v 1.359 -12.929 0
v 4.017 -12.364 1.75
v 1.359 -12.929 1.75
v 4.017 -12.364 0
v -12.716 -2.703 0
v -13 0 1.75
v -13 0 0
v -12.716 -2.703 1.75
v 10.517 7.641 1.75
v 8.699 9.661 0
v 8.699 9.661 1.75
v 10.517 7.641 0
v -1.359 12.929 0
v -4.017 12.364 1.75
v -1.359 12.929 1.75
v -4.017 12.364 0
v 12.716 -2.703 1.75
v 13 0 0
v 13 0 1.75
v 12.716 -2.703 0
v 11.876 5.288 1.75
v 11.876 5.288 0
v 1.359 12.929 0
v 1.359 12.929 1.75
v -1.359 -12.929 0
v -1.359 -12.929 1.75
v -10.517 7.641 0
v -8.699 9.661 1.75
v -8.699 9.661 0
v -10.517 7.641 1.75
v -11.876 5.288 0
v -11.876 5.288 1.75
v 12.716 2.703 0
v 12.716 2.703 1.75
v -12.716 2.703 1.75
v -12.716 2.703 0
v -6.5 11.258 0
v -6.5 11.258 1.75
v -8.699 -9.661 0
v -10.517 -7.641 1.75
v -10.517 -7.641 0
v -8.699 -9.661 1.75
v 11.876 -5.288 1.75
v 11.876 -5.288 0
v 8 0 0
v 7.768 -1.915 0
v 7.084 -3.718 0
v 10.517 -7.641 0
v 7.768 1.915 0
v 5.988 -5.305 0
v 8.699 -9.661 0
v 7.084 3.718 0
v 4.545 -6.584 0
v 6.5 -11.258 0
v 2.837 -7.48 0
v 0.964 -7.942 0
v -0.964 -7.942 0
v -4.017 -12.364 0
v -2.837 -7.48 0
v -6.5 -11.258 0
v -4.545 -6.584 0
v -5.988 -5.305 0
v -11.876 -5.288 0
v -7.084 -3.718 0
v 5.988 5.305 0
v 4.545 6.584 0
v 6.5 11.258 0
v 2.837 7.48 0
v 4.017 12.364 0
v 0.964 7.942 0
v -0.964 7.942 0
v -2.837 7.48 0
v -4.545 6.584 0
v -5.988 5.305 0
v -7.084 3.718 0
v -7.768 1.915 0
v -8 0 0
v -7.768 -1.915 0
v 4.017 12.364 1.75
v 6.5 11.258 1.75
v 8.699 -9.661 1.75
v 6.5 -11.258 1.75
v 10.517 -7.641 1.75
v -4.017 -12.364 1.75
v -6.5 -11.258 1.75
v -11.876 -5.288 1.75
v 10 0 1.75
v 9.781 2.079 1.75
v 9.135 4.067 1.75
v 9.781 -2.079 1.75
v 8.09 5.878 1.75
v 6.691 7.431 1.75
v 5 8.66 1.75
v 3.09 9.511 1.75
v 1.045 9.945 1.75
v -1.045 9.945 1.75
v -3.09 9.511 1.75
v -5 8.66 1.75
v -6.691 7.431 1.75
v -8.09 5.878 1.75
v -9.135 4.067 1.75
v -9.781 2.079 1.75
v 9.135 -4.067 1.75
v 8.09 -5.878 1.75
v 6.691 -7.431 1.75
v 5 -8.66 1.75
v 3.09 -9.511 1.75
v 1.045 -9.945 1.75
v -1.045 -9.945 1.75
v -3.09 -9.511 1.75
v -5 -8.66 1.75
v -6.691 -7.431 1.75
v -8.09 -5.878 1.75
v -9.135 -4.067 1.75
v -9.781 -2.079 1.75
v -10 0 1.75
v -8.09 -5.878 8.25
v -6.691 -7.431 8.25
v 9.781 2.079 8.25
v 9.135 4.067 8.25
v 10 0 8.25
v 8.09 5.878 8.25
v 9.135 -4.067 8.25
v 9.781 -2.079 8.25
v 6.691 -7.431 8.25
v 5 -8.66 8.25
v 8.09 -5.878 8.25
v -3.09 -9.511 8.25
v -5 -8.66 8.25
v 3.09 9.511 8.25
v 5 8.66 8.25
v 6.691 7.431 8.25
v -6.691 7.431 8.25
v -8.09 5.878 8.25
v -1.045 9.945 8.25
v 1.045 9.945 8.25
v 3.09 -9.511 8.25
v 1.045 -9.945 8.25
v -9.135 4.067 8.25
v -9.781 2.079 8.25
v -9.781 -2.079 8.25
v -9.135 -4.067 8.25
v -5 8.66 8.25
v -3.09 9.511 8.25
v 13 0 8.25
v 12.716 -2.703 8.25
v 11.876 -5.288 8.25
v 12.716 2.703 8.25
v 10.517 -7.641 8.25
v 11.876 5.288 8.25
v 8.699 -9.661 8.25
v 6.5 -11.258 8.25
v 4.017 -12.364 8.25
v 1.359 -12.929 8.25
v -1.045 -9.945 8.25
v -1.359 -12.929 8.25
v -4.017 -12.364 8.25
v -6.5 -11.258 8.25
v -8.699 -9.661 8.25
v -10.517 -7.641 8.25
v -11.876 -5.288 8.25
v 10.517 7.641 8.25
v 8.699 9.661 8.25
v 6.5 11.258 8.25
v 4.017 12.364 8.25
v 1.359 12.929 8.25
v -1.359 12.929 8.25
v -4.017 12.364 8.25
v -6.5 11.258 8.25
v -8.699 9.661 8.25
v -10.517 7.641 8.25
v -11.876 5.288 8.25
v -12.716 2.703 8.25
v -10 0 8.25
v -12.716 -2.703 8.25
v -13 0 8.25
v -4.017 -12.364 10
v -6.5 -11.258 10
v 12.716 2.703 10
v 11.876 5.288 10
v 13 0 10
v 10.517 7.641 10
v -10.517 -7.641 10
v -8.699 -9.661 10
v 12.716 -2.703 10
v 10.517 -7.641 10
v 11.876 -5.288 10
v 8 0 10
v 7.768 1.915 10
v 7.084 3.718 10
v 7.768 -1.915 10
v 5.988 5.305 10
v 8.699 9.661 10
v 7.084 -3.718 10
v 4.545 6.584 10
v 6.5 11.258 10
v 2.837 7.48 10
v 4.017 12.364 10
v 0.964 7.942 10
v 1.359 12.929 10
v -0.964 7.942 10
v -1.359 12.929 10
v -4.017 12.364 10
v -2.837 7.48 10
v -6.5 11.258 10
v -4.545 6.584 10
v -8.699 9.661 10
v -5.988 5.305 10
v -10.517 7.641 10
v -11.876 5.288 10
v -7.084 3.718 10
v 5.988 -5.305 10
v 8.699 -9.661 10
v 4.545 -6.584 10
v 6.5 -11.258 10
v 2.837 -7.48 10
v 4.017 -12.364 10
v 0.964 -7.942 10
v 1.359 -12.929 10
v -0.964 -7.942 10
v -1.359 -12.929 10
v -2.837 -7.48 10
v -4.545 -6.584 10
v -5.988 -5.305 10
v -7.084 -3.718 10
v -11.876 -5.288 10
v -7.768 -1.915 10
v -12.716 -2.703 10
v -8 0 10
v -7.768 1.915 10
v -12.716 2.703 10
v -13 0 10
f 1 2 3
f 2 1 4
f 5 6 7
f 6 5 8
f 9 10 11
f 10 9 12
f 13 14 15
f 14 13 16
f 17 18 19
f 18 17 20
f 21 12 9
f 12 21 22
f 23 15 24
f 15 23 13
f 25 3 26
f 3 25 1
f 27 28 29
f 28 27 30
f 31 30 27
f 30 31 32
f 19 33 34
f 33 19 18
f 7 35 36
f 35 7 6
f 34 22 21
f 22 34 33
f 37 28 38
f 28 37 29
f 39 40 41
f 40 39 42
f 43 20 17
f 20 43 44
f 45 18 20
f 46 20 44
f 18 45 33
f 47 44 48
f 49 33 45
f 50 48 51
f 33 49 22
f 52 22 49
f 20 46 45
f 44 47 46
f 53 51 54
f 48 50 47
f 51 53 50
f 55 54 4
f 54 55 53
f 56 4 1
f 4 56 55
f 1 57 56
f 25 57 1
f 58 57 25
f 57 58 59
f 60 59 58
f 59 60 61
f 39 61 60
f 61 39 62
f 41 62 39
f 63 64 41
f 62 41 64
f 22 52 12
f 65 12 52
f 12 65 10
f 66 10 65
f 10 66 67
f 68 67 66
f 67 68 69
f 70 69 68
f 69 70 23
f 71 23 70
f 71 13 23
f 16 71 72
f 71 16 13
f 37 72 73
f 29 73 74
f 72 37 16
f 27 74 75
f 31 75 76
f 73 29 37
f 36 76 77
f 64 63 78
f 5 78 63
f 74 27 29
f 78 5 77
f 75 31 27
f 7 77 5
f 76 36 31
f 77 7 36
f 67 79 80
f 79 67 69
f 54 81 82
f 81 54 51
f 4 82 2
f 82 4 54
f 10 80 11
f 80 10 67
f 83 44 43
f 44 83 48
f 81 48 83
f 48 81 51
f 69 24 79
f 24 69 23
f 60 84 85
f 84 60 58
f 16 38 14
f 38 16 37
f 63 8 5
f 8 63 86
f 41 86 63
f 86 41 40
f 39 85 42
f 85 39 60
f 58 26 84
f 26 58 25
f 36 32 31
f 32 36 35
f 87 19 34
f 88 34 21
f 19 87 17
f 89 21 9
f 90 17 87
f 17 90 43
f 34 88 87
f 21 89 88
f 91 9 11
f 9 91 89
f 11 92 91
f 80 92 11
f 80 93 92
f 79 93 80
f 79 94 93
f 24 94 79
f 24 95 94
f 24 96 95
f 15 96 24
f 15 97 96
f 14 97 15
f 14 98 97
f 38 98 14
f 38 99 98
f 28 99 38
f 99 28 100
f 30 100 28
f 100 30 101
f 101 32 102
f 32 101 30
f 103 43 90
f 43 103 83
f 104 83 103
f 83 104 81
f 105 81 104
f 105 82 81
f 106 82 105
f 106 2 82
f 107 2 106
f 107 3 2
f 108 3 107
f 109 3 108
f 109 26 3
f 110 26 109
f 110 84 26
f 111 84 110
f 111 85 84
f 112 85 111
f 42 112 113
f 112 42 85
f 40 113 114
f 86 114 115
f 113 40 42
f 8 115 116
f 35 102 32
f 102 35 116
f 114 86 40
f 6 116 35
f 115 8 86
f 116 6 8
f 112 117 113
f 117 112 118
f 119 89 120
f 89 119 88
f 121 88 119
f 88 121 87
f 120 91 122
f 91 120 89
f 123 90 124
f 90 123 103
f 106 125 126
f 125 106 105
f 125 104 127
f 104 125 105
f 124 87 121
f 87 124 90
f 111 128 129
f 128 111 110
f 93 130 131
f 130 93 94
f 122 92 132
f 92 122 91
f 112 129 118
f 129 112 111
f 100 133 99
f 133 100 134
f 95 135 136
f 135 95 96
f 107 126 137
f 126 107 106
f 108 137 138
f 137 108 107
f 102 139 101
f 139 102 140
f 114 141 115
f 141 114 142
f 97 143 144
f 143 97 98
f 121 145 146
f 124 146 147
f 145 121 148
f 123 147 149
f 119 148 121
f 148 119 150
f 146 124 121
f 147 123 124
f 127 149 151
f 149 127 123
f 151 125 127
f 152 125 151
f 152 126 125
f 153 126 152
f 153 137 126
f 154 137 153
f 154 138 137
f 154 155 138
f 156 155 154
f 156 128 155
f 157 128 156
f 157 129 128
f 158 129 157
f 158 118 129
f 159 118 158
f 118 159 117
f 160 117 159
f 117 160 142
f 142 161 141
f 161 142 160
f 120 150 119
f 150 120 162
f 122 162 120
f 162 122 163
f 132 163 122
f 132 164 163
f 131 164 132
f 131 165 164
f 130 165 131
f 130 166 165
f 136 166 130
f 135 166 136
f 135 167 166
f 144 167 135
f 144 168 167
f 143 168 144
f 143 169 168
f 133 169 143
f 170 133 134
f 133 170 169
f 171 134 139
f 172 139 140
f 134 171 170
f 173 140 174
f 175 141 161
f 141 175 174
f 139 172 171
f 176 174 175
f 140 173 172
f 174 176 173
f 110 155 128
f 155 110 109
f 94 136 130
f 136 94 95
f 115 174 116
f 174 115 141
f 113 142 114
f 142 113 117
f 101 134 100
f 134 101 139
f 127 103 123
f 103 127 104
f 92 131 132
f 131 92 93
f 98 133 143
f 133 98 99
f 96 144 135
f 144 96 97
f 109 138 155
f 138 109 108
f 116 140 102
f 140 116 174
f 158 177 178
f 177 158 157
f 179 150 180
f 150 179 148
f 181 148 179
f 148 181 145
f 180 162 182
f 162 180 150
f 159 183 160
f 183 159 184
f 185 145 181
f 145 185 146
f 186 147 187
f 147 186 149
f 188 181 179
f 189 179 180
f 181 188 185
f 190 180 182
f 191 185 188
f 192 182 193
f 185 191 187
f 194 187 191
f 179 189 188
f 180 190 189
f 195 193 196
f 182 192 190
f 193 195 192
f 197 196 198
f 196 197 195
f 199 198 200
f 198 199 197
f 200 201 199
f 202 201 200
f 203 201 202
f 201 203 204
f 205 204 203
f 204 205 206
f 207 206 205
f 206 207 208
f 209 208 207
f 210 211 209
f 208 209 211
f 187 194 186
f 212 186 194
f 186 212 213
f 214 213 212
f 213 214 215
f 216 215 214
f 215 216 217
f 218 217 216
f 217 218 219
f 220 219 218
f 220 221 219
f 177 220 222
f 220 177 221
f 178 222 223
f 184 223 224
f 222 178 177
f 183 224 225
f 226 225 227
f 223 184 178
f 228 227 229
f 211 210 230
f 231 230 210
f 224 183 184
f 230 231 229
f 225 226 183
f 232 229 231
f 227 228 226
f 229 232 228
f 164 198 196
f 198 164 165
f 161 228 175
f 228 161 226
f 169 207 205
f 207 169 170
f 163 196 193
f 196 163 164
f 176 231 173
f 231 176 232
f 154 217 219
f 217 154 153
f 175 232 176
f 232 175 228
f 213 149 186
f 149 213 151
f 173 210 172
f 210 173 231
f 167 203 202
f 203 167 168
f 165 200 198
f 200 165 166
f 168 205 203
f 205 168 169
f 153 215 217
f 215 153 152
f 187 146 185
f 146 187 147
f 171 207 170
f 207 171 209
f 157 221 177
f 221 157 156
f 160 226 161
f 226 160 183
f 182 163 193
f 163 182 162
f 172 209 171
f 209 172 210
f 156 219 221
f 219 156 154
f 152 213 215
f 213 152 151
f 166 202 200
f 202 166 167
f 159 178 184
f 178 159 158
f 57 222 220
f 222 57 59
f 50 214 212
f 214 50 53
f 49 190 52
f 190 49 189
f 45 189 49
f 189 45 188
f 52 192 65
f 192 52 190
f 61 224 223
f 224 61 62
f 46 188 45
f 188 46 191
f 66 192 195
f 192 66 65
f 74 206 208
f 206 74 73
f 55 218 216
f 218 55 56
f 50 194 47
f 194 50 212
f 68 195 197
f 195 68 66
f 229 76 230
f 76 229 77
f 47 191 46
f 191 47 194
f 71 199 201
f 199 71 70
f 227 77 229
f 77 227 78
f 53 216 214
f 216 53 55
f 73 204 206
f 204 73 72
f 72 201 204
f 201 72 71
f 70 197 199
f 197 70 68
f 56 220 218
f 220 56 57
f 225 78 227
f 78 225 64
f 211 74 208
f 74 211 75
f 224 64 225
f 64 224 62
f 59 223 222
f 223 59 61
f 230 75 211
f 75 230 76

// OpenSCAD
// Uncomment before final render
//$fa = 0.01;
//$fs = 0.25;

module xAxisPulley() {
  difference() {
    union() {
      cylinder(1.75, 13, 13);
      translate([0, 0, 1.75]) {
        cylinder(6.5, 10, 10);
      }
      translate([0, 0, 8.25]) {
        cylinder(1.75, 13, 13);
      }
    }
    translate([0, 0, -1]) {
      cylinder(12, 8, 8);
    }
  }
}

xAxisPulley();
